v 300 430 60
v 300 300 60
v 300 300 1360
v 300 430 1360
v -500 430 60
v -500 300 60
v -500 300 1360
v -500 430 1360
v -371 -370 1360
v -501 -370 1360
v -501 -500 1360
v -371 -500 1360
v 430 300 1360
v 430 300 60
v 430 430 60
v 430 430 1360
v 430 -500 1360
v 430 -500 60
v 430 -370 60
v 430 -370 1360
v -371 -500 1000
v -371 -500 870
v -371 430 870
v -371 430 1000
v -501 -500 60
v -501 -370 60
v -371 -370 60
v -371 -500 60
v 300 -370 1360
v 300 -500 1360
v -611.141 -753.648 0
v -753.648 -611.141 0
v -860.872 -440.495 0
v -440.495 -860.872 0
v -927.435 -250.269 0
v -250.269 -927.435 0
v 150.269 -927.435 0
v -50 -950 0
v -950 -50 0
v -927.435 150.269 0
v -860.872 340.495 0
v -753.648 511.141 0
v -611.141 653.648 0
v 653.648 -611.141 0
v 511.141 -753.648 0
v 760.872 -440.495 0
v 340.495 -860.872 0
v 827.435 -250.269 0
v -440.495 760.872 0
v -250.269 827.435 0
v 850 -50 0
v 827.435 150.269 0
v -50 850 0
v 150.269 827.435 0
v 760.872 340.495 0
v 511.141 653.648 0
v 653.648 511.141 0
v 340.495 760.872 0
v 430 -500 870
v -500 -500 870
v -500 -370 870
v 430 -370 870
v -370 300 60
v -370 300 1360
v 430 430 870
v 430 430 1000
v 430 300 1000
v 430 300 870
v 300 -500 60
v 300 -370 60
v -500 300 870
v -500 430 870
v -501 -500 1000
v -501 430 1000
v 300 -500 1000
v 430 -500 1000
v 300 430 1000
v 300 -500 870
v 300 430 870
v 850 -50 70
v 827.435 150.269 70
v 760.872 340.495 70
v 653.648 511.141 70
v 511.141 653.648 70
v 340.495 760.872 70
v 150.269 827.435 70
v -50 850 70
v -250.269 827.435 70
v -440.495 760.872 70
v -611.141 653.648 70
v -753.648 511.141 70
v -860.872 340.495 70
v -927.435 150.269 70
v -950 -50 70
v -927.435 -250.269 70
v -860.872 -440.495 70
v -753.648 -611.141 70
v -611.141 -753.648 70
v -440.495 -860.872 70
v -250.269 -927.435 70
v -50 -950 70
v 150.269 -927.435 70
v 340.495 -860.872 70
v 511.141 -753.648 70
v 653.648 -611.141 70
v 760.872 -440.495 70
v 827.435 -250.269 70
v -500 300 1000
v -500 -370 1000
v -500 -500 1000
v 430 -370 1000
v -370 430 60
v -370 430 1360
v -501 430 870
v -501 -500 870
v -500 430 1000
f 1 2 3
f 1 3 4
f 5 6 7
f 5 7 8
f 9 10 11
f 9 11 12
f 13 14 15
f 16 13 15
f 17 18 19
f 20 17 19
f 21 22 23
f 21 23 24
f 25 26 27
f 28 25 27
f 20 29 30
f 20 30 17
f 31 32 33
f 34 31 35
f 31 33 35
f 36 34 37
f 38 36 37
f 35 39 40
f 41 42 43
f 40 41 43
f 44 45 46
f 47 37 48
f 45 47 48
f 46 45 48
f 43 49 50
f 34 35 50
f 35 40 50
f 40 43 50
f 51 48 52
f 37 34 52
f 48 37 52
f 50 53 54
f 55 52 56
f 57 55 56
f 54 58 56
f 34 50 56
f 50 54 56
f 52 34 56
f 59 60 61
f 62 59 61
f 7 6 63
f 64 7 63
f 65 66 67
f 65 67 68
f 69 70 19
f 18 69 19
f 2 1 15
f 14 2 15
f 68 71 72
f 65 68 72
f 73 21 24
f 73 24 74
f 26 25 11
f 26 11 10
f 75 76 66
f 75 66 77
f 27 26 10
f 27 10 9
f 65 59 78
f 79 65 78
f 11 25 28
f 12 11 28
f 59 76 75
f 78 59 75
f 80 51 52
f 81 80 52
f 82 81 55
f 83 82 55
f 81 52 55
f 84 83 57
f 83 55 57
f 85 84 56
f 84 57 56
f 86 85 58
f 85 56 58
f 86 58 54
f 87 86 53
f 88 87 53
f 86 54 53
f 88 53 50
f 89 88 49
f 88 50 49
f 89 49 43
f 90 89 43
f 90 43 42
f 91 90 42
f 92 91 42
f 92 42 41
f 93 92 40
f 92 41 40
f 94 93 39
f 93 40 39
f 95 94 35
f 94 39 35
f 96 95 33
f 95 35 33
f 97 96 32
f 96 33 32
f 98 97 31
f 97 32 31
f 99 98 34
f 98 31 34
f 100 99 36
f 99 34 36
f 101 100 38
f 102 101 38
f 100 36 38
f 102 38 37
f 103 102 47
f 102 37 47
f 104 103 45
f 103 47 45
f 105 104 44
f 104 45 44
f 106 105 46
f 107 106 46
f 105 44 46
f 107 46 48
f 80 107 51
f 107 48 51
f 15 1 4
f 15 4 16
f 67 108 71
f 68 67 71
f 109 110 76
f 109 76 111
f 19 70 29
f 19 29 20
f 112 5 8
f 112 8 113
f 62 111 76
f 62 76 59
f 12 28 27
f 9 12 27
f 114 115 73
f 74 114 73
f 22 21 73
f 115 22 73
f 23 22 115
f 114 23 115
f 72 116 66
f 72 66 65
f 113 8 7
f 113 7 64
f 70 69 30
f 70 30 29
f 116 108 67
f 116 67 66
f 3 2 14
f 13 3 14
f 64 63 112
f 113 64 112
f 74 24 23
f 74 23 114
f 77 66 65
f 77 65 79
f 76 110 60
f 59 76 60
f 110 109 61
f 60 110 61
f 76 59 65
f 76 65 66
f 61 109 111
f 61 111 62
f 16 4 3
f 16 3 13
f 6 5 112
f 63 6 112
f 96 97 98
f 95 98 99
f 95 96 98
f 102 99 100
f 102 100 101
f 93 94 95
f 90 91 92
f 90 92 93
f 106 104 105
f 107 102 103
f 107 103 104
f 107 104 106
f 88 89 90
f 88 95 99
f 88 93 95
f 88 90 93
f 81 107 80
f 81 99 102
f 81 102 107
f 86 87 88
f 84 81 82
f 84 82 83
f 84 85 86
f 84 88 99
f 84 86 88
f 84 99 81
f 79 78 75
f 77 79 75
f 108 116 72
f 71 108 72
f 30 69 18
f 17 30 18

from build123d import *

# Parameters (mm, degrees)
CYLINDER_R     = 900
CYLINDER_DEPTH = 70
BOX_W          = 130
BOX_H          = 130
BOX_DEPTH      = 1300
BOX001_W       = 130
BOX001_H       = 130
BOX001_DEPTH   = 1300
BOX002_W       = 130
BOX002_H       = 130
BOX002_DEPTH   = 1300
BOX003_W       = 130
BOX003_H       = 130
BOX003_DEPTH   = 1300
BOX004_W       = 130
BOX004_H       = 130
BOX004_DEPTH   = 930
BOX005_W       = 130
BOX005_H       = 130
BOX005_DEPTH   = 930
BOX006_W       = 130
BOX006_H       = 130
BOX006_DEPTH   = 930
BOX007_W       = 130
BOX007_H       = 130
BOX007_DEPTH   = 930


with BuildPart() as tablero:
    # Cylinder → Cylinder (new body)
    with BuildSketch(Plane(origin=(-50, -50, 0), x_dir=(1, 0, 0), z_dir=(0, 0, 1))):
        Circle(CYLINDER_R)
    extrude(amount=CYLINDER_DEPTH)


with BuildPart() as pata1:
    # Box → Box (new body)
    with BuildSketch(Plane(origin=(-501, -500, 60), x_dir=(1, 0, 0), z_dir=(0, 0, 1))):
        with Locations((65, 65)):
            Rectangle(BOX_W, BOX_H)
    extrude(amount=BOX_DEPTH)


with BuildPart() as pata2:
    # Box001 → Box001 (new body)
    with BuildSketch(Plane(origin=(300, -500, 60), x_dir=(1, 0, 0), z_dir=(0, 0, 1))):
        with Locations((65, 65)):
            Rectangle(BOX001_W, BOX001_H)
    extrude(amount=BOX001_DEPTH)


with BuildPart() as pata3:
    # Box002 → Box002 (new body)
    with BuildSketch(Plane(origin=(300, 300, 60), x_dir=(1, 0, 0), z_dir=(0, 0, 1))):
        with Locations((65, 65)):
            Rectangle(BOX002_W, BOX002_H)
    extrude(amount=BOX002_DEPTH)


with BuildPart() as pata4:
    # Box003 → Box003 (new body)
    with BuildSketch(Plane(origin=(-500, 300, 60), x_dir=(1, 0, 0), z_dir=(0, 0, 1))):
        with Locations((65, 65)):
            Rectangle(BOX003_W, BOX003_H)
    extrude(amount=BOX003_DEPTH)


with BuildPart() as union_pata1:
    # Box004 → Box004 (new body)
    with BuildSketch(Plane(origin=(-500, 300, 1000), x_dir=(0, 0, -1), z_dir=(1, 0, 0))):
        with Locations((65, 65)):
            Rectangle(BOX004_W, BOX004_H)
    extrude(amount=BOX004_DEPTH)


with BuildPart() as union_pata2:
    # Box005 → Box005 (new body)
    with BuildSketch(Plane(origin=(-500, -500, 1000), x_dir=(0, 0, -1), z_dir=(1, 0, 0))):
        with Locations((65, 65)):
            Rectangle(BOX005_W, BOX005_H)
    extrude(amount=BOX005_DEPTH)


with BuildPart() as union_pata3:
    # Box006 → Box006 (new body)
    with BuildSketch(Plane(origin=(-371, -500, 870), x_dir=(-1, 0, 0), z_dir=(0, 1, 0))):
        with Locations((65, 65)):
            Rectangle(BOX006_W, BOX006_H)
    extrude(amount=BOX006_DEPTH)


with BuildPart() as union_pata4:
    # Box007 → Box007 (new body)
    with BuildSketch(Plane(origin=(430, -500, 870), x_dir=(-1, 0, 0), z_dir=(0, 1, 0))):
        with Locations((65, 65)):
            Rectangle(BOX007_W, BOX007_H)
    extrude(amount=BOX007_DEPTH)


solid = Compound([tablero.part, pata1.part, pata2.part, pata3.part, pata4.part, union_pata1.part, union_pata2.part, union_pata3.part, union_pata4.part])
